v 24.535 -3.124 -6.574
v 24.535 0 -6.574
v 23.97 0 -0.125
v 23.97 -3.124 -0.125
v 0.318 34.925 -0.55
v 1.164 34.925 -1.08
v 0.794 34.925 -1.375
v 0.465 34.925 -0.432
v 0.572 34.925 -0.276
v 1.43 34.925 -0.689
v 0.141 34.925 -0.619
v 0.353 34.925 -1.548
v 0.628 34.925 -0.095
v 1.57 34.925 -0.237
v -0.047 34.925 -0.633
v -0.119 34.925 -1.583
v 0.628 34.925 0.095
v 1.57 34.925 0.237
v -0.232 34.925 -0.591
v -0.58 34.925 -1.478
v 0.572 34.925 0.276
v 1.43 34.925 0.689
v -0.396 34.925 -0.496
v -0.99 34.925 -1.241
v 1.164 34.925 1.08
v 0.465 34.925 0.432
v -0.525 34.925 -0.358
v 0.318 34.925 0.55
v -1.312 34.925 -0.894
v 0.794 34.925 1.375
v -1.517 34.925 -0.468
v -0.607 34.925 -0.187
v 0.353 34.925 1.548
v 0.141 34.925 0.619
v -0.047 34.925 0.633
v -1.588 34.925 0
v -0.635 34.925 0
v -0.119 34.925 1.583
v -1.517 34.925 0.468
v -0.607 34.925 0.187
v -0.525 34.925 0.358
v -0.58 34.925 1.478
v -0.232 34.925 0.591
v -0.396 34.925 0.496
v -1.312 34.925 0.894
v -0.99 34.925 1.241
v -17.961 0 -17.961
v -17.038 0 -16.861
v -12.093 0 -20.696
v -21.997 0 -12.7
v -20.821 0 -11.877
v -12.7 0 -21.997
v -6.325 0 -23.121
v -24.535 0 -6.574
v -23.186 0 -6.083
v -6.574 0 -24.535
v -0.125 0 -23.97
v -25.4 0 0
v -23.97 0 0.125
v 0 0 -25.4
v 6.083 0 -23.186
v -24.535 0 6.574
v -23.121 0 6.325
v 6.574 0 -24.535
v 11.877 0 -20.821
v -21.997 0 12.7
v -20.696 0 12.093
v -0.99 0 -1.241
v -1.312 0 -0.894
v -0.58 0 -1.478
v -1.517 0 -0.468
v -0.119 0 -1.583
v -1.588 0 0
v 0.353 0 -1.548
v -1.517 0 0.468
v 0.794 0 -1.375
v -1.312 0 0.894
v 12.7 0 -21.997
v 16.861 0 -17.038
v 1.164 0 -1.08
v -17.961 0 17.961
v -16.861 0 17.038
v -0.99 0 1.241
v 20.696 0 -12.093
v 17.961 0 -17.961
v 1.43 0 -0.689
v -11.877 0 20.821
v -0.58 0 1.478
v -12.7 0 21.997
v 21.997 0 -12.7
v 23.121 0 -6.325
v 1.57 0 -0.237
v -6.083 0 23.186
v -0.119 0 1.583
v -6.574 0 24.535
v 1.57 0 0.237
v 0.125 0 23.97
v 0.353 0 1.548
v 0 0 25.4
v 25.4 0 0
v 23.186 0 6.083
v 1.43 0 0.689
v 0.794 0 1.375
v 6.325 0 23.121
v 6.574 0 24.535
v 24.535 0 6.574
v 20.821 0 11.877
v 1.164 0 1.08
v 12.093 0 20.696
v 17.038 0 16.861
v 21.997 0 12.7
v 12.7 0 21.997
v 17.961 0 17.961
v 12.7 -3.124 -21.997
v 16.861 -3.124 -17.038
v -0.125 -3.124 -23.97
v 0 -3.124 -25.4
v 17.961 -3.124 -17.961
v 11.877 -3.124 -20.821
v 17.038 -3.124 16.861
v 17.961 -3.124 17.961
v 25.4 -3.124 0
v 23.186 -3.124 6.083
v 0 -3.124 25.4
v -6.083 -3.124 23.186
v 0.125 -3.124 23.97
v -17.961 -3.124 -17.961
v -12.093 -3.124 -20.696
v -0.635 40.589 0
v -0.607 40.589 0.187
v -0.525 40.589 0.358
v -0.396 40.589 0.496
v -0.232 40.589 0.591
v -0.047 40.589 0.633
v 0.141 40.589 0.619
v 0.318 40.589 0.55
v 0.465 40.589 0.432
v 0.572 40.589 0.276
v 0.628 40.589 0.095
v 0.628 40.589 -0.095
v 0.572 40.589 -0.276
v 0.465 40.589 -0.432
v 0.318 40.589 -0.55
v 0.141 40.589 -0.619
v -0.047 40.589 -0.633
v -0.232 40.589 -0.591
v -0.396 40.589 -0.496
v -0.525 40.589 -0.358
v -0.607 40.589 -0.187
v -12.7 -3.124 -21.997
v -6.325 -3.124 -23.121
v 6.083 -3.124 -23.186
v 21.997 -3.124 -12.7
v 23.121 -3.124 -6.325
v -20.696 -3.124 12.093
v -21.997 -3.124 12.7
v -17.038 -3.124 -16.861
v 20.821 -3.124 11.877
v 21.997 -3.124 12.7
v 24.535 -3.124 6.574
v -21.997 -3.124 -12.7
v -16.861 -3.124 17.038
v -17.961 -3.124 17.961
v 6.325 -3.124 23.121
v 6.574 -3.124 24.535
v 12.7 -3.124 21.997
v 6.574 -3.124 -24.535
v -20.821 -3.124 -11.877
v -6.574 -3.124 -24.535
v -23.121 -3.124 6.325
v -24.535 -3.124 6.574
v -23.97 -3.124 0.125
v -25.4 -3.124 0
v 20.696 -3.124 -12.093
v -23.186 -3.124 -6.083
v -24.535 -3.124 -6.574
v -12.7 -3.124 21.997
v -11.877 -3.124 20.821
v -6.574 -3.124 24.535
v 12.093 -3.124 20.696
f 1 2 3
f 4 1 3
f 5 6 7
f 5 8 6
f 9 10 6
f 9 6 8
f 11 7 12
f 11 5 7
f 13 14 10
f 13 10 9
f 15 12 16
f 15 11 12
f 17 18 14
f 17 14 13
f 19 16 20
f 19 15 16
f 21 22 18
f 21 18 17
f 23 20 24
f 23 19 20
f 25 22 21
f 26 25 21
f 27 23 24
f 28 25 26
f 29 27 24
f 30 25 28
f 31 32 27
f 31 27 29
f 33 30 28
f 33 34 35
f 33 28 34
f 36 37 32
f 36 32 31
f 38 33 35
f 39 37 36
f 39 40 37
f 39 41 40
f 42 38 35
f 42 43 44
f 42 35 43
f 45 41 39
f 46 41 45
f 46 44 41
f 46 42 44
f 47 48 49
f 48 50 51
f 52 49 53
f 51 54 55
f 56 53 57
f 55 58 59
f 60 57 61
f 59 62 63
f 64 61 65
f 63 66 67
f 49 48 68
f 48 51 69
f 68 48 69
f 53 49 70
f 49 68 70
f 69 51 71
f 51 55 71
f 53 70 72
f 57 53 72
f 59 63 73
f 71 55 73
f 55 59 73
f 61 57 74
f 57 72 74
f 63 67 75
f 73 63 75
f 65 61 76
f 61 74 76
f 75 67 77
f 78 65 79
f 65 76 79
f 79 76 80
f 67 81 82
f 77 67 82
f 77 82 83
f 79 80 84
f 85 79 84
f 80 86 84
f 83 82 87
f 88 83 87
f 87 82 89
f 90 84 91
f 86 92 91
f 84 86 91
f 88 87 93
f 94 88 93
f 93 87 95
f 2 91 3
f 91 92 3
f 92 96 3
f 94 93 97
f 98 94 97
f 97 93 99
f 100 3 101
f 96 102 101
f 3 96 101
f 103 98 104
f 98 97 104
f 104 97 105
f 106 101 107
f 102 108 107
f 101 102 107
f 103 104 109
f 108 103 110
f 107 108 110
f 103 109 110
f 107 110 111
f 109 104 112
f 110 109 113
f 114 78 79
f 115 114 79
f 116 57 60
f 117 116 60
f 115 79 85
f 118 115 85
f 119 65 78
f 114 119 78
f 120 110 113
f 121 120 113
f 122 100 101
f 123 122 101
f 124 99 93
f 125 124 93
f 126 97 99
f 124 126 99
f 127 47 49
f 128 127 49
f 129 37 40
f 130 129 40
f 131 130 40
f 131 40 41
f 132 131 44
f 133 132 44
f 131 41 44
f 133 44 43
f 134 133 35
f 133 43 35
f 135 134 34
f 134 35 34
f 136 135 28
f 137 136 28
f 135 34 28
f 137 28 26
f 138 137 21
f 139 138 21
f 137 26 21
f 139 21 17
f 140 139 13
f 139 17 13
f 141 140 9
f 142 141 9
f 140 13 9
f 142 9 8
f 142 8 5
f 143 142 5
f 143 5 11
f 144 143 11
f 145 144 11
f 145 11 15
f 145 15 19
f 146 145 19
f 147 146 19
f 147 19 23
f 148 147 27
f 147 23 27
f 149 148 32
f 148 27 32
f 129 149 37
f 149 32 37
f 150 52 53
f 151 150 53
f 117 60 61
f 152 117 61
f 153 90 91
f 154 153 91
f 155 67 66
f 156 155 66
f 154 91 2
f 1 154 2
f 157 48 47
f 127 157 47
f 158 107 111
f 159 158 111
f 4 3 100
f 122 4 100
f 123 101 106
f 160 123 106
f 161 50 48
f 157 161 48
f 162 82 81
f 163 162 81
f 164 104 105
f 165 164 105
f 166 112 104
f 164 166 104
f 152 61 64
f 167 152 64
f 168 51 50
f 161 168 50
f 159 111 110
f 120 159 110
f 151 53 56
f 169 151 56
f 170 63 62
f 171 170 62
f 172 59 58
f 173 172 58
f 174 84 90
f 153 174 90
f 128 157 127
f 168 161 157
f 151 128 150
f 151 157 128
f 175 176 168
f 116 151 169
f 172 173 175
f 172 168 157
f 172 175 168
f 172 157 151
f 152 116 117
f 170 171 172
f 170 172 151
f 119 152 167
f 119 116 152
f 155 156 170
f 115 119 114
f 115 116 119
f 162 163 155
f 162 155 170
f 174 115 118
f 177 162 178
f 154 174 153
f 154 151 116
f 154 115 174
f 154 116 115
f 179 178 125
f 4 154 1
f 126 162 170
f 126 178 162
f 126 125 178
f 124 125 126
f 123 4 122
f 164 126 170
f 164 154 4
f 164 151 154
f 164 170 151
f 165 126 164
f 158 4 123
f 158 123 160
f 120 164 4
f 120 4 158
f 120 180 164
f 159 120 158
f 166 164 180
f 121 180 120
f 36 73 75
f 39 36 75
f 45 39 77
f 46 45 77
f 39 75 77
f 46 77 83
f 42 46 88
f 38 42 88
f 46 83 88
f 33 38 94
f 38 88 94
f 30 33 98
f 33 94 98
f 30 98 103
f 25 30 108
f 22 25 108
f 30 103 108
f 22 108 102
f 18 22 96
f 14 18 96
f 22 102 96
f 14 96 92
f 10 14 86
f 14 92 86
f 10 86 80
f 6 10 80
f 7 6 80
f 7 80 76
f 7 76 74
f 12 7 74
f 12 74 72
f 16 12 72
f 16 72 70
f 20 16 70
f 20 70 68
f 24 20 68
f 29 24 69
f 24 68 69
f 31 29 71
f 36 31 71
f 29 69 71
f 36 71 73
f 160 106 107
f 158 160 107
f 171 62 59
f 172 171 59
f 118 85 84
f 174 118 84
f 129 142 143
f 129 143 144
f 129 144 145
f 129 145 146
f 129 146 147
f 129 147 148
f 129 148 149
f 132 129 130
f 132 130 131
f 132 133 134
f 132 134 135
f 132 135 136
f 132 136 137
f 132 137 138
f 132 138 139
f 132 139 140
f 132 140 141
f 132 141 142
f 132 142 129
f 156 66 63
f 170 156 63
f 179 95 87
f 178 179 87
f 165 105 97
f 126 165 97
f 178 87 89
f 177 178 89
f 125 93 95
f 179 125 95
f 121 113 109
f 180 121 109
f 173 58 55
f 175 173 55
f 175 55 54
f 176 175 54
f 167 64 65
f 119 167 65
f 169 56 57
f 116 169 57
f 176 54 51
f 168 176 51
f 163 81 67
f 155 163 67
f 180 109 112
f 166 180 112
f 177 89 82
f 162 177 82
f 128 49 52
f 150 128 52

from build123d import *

# Parameters (mm, degrees)
F1_DEPTH = 3.1242
F2_R     = 1.5875
F3_DEPTH = 34.925
F4_R     = 0.635
F5_DEPTH = 5.6642


with BuildPart() as f1:
    # F0 (on Front) → F1 (new body)
    with BuildSketch(Plane.XZ):
        Polygon((0.125082, 23.970308), (0, 25.4), (-6.083153, 23.185914), (-6.574004, 24.534516), (-11.87683, 20.821437), (-12.7, 21.997045), (-16.861121, 17.038014), (-17.960512, 17.960512), (-20.696355, 12.093478), (-21.997045, 12.7), (-23.121166, 6.324792), (-24.534516, 6.574004), (-23.970308, 0.125082), (-25.4, 0), (-23.185914, -6.083153), (-24.534516, -6.574004), (-20.821437, -11.87683), (-21.997045, -12.7), (-17.038014, -16.861121), (-17.960512, -17.960512), (-12.093478, -20.696355), (-12.7, -21.997045), (-6.324792, -23.121166), (-6.574004, -24.534516), (-0.125082, -23.970308), (0, -25.4), (6.083153, -23.185914), (6.574004, -24.534516), (11.87683, -20.821437), (12.7, -21.997045), (16.861121, -17.038014), (17.960512, -17.960512), (20.696355, -12.093478), (21.997045, -12.7), (23.121166, -6.324792), (24.534516, -6.574004), (23.970308, -0.125082), (25.4, 0), (23.185914, 6.083153), (24.534516, 6.574004), (20.821437, 11.87683), (21.997045, 12.7), (17.038014, 16.861121), (17.960512, 17.960512), (12.093478, 20.696355), (12.7, 21.997045), (6.324792, 23.121166), (6.574004, 24.534516), align=None)
    extrude(amount=F1_DEPTH)

    # F2 (on face) → F3 (join)
    with BuildSketch(Plane(origin=(0, 0, 0), x_dir=(-1, 0, 0), z_dir=(0, 1, 0))):
        Circle(F2_R)
    extrude(amount=F3_DEPTH)

    # F4 (on face) → F5 (join)
    with BuildSketch(Plane(origin=(0, 34.925, 0), x_dir=(-1, 0, 0), z_dir=(0, 1, 0))):
        Circle(F4_R)
    extrude(amount=F5_DEPTH)


solid = f1.part
